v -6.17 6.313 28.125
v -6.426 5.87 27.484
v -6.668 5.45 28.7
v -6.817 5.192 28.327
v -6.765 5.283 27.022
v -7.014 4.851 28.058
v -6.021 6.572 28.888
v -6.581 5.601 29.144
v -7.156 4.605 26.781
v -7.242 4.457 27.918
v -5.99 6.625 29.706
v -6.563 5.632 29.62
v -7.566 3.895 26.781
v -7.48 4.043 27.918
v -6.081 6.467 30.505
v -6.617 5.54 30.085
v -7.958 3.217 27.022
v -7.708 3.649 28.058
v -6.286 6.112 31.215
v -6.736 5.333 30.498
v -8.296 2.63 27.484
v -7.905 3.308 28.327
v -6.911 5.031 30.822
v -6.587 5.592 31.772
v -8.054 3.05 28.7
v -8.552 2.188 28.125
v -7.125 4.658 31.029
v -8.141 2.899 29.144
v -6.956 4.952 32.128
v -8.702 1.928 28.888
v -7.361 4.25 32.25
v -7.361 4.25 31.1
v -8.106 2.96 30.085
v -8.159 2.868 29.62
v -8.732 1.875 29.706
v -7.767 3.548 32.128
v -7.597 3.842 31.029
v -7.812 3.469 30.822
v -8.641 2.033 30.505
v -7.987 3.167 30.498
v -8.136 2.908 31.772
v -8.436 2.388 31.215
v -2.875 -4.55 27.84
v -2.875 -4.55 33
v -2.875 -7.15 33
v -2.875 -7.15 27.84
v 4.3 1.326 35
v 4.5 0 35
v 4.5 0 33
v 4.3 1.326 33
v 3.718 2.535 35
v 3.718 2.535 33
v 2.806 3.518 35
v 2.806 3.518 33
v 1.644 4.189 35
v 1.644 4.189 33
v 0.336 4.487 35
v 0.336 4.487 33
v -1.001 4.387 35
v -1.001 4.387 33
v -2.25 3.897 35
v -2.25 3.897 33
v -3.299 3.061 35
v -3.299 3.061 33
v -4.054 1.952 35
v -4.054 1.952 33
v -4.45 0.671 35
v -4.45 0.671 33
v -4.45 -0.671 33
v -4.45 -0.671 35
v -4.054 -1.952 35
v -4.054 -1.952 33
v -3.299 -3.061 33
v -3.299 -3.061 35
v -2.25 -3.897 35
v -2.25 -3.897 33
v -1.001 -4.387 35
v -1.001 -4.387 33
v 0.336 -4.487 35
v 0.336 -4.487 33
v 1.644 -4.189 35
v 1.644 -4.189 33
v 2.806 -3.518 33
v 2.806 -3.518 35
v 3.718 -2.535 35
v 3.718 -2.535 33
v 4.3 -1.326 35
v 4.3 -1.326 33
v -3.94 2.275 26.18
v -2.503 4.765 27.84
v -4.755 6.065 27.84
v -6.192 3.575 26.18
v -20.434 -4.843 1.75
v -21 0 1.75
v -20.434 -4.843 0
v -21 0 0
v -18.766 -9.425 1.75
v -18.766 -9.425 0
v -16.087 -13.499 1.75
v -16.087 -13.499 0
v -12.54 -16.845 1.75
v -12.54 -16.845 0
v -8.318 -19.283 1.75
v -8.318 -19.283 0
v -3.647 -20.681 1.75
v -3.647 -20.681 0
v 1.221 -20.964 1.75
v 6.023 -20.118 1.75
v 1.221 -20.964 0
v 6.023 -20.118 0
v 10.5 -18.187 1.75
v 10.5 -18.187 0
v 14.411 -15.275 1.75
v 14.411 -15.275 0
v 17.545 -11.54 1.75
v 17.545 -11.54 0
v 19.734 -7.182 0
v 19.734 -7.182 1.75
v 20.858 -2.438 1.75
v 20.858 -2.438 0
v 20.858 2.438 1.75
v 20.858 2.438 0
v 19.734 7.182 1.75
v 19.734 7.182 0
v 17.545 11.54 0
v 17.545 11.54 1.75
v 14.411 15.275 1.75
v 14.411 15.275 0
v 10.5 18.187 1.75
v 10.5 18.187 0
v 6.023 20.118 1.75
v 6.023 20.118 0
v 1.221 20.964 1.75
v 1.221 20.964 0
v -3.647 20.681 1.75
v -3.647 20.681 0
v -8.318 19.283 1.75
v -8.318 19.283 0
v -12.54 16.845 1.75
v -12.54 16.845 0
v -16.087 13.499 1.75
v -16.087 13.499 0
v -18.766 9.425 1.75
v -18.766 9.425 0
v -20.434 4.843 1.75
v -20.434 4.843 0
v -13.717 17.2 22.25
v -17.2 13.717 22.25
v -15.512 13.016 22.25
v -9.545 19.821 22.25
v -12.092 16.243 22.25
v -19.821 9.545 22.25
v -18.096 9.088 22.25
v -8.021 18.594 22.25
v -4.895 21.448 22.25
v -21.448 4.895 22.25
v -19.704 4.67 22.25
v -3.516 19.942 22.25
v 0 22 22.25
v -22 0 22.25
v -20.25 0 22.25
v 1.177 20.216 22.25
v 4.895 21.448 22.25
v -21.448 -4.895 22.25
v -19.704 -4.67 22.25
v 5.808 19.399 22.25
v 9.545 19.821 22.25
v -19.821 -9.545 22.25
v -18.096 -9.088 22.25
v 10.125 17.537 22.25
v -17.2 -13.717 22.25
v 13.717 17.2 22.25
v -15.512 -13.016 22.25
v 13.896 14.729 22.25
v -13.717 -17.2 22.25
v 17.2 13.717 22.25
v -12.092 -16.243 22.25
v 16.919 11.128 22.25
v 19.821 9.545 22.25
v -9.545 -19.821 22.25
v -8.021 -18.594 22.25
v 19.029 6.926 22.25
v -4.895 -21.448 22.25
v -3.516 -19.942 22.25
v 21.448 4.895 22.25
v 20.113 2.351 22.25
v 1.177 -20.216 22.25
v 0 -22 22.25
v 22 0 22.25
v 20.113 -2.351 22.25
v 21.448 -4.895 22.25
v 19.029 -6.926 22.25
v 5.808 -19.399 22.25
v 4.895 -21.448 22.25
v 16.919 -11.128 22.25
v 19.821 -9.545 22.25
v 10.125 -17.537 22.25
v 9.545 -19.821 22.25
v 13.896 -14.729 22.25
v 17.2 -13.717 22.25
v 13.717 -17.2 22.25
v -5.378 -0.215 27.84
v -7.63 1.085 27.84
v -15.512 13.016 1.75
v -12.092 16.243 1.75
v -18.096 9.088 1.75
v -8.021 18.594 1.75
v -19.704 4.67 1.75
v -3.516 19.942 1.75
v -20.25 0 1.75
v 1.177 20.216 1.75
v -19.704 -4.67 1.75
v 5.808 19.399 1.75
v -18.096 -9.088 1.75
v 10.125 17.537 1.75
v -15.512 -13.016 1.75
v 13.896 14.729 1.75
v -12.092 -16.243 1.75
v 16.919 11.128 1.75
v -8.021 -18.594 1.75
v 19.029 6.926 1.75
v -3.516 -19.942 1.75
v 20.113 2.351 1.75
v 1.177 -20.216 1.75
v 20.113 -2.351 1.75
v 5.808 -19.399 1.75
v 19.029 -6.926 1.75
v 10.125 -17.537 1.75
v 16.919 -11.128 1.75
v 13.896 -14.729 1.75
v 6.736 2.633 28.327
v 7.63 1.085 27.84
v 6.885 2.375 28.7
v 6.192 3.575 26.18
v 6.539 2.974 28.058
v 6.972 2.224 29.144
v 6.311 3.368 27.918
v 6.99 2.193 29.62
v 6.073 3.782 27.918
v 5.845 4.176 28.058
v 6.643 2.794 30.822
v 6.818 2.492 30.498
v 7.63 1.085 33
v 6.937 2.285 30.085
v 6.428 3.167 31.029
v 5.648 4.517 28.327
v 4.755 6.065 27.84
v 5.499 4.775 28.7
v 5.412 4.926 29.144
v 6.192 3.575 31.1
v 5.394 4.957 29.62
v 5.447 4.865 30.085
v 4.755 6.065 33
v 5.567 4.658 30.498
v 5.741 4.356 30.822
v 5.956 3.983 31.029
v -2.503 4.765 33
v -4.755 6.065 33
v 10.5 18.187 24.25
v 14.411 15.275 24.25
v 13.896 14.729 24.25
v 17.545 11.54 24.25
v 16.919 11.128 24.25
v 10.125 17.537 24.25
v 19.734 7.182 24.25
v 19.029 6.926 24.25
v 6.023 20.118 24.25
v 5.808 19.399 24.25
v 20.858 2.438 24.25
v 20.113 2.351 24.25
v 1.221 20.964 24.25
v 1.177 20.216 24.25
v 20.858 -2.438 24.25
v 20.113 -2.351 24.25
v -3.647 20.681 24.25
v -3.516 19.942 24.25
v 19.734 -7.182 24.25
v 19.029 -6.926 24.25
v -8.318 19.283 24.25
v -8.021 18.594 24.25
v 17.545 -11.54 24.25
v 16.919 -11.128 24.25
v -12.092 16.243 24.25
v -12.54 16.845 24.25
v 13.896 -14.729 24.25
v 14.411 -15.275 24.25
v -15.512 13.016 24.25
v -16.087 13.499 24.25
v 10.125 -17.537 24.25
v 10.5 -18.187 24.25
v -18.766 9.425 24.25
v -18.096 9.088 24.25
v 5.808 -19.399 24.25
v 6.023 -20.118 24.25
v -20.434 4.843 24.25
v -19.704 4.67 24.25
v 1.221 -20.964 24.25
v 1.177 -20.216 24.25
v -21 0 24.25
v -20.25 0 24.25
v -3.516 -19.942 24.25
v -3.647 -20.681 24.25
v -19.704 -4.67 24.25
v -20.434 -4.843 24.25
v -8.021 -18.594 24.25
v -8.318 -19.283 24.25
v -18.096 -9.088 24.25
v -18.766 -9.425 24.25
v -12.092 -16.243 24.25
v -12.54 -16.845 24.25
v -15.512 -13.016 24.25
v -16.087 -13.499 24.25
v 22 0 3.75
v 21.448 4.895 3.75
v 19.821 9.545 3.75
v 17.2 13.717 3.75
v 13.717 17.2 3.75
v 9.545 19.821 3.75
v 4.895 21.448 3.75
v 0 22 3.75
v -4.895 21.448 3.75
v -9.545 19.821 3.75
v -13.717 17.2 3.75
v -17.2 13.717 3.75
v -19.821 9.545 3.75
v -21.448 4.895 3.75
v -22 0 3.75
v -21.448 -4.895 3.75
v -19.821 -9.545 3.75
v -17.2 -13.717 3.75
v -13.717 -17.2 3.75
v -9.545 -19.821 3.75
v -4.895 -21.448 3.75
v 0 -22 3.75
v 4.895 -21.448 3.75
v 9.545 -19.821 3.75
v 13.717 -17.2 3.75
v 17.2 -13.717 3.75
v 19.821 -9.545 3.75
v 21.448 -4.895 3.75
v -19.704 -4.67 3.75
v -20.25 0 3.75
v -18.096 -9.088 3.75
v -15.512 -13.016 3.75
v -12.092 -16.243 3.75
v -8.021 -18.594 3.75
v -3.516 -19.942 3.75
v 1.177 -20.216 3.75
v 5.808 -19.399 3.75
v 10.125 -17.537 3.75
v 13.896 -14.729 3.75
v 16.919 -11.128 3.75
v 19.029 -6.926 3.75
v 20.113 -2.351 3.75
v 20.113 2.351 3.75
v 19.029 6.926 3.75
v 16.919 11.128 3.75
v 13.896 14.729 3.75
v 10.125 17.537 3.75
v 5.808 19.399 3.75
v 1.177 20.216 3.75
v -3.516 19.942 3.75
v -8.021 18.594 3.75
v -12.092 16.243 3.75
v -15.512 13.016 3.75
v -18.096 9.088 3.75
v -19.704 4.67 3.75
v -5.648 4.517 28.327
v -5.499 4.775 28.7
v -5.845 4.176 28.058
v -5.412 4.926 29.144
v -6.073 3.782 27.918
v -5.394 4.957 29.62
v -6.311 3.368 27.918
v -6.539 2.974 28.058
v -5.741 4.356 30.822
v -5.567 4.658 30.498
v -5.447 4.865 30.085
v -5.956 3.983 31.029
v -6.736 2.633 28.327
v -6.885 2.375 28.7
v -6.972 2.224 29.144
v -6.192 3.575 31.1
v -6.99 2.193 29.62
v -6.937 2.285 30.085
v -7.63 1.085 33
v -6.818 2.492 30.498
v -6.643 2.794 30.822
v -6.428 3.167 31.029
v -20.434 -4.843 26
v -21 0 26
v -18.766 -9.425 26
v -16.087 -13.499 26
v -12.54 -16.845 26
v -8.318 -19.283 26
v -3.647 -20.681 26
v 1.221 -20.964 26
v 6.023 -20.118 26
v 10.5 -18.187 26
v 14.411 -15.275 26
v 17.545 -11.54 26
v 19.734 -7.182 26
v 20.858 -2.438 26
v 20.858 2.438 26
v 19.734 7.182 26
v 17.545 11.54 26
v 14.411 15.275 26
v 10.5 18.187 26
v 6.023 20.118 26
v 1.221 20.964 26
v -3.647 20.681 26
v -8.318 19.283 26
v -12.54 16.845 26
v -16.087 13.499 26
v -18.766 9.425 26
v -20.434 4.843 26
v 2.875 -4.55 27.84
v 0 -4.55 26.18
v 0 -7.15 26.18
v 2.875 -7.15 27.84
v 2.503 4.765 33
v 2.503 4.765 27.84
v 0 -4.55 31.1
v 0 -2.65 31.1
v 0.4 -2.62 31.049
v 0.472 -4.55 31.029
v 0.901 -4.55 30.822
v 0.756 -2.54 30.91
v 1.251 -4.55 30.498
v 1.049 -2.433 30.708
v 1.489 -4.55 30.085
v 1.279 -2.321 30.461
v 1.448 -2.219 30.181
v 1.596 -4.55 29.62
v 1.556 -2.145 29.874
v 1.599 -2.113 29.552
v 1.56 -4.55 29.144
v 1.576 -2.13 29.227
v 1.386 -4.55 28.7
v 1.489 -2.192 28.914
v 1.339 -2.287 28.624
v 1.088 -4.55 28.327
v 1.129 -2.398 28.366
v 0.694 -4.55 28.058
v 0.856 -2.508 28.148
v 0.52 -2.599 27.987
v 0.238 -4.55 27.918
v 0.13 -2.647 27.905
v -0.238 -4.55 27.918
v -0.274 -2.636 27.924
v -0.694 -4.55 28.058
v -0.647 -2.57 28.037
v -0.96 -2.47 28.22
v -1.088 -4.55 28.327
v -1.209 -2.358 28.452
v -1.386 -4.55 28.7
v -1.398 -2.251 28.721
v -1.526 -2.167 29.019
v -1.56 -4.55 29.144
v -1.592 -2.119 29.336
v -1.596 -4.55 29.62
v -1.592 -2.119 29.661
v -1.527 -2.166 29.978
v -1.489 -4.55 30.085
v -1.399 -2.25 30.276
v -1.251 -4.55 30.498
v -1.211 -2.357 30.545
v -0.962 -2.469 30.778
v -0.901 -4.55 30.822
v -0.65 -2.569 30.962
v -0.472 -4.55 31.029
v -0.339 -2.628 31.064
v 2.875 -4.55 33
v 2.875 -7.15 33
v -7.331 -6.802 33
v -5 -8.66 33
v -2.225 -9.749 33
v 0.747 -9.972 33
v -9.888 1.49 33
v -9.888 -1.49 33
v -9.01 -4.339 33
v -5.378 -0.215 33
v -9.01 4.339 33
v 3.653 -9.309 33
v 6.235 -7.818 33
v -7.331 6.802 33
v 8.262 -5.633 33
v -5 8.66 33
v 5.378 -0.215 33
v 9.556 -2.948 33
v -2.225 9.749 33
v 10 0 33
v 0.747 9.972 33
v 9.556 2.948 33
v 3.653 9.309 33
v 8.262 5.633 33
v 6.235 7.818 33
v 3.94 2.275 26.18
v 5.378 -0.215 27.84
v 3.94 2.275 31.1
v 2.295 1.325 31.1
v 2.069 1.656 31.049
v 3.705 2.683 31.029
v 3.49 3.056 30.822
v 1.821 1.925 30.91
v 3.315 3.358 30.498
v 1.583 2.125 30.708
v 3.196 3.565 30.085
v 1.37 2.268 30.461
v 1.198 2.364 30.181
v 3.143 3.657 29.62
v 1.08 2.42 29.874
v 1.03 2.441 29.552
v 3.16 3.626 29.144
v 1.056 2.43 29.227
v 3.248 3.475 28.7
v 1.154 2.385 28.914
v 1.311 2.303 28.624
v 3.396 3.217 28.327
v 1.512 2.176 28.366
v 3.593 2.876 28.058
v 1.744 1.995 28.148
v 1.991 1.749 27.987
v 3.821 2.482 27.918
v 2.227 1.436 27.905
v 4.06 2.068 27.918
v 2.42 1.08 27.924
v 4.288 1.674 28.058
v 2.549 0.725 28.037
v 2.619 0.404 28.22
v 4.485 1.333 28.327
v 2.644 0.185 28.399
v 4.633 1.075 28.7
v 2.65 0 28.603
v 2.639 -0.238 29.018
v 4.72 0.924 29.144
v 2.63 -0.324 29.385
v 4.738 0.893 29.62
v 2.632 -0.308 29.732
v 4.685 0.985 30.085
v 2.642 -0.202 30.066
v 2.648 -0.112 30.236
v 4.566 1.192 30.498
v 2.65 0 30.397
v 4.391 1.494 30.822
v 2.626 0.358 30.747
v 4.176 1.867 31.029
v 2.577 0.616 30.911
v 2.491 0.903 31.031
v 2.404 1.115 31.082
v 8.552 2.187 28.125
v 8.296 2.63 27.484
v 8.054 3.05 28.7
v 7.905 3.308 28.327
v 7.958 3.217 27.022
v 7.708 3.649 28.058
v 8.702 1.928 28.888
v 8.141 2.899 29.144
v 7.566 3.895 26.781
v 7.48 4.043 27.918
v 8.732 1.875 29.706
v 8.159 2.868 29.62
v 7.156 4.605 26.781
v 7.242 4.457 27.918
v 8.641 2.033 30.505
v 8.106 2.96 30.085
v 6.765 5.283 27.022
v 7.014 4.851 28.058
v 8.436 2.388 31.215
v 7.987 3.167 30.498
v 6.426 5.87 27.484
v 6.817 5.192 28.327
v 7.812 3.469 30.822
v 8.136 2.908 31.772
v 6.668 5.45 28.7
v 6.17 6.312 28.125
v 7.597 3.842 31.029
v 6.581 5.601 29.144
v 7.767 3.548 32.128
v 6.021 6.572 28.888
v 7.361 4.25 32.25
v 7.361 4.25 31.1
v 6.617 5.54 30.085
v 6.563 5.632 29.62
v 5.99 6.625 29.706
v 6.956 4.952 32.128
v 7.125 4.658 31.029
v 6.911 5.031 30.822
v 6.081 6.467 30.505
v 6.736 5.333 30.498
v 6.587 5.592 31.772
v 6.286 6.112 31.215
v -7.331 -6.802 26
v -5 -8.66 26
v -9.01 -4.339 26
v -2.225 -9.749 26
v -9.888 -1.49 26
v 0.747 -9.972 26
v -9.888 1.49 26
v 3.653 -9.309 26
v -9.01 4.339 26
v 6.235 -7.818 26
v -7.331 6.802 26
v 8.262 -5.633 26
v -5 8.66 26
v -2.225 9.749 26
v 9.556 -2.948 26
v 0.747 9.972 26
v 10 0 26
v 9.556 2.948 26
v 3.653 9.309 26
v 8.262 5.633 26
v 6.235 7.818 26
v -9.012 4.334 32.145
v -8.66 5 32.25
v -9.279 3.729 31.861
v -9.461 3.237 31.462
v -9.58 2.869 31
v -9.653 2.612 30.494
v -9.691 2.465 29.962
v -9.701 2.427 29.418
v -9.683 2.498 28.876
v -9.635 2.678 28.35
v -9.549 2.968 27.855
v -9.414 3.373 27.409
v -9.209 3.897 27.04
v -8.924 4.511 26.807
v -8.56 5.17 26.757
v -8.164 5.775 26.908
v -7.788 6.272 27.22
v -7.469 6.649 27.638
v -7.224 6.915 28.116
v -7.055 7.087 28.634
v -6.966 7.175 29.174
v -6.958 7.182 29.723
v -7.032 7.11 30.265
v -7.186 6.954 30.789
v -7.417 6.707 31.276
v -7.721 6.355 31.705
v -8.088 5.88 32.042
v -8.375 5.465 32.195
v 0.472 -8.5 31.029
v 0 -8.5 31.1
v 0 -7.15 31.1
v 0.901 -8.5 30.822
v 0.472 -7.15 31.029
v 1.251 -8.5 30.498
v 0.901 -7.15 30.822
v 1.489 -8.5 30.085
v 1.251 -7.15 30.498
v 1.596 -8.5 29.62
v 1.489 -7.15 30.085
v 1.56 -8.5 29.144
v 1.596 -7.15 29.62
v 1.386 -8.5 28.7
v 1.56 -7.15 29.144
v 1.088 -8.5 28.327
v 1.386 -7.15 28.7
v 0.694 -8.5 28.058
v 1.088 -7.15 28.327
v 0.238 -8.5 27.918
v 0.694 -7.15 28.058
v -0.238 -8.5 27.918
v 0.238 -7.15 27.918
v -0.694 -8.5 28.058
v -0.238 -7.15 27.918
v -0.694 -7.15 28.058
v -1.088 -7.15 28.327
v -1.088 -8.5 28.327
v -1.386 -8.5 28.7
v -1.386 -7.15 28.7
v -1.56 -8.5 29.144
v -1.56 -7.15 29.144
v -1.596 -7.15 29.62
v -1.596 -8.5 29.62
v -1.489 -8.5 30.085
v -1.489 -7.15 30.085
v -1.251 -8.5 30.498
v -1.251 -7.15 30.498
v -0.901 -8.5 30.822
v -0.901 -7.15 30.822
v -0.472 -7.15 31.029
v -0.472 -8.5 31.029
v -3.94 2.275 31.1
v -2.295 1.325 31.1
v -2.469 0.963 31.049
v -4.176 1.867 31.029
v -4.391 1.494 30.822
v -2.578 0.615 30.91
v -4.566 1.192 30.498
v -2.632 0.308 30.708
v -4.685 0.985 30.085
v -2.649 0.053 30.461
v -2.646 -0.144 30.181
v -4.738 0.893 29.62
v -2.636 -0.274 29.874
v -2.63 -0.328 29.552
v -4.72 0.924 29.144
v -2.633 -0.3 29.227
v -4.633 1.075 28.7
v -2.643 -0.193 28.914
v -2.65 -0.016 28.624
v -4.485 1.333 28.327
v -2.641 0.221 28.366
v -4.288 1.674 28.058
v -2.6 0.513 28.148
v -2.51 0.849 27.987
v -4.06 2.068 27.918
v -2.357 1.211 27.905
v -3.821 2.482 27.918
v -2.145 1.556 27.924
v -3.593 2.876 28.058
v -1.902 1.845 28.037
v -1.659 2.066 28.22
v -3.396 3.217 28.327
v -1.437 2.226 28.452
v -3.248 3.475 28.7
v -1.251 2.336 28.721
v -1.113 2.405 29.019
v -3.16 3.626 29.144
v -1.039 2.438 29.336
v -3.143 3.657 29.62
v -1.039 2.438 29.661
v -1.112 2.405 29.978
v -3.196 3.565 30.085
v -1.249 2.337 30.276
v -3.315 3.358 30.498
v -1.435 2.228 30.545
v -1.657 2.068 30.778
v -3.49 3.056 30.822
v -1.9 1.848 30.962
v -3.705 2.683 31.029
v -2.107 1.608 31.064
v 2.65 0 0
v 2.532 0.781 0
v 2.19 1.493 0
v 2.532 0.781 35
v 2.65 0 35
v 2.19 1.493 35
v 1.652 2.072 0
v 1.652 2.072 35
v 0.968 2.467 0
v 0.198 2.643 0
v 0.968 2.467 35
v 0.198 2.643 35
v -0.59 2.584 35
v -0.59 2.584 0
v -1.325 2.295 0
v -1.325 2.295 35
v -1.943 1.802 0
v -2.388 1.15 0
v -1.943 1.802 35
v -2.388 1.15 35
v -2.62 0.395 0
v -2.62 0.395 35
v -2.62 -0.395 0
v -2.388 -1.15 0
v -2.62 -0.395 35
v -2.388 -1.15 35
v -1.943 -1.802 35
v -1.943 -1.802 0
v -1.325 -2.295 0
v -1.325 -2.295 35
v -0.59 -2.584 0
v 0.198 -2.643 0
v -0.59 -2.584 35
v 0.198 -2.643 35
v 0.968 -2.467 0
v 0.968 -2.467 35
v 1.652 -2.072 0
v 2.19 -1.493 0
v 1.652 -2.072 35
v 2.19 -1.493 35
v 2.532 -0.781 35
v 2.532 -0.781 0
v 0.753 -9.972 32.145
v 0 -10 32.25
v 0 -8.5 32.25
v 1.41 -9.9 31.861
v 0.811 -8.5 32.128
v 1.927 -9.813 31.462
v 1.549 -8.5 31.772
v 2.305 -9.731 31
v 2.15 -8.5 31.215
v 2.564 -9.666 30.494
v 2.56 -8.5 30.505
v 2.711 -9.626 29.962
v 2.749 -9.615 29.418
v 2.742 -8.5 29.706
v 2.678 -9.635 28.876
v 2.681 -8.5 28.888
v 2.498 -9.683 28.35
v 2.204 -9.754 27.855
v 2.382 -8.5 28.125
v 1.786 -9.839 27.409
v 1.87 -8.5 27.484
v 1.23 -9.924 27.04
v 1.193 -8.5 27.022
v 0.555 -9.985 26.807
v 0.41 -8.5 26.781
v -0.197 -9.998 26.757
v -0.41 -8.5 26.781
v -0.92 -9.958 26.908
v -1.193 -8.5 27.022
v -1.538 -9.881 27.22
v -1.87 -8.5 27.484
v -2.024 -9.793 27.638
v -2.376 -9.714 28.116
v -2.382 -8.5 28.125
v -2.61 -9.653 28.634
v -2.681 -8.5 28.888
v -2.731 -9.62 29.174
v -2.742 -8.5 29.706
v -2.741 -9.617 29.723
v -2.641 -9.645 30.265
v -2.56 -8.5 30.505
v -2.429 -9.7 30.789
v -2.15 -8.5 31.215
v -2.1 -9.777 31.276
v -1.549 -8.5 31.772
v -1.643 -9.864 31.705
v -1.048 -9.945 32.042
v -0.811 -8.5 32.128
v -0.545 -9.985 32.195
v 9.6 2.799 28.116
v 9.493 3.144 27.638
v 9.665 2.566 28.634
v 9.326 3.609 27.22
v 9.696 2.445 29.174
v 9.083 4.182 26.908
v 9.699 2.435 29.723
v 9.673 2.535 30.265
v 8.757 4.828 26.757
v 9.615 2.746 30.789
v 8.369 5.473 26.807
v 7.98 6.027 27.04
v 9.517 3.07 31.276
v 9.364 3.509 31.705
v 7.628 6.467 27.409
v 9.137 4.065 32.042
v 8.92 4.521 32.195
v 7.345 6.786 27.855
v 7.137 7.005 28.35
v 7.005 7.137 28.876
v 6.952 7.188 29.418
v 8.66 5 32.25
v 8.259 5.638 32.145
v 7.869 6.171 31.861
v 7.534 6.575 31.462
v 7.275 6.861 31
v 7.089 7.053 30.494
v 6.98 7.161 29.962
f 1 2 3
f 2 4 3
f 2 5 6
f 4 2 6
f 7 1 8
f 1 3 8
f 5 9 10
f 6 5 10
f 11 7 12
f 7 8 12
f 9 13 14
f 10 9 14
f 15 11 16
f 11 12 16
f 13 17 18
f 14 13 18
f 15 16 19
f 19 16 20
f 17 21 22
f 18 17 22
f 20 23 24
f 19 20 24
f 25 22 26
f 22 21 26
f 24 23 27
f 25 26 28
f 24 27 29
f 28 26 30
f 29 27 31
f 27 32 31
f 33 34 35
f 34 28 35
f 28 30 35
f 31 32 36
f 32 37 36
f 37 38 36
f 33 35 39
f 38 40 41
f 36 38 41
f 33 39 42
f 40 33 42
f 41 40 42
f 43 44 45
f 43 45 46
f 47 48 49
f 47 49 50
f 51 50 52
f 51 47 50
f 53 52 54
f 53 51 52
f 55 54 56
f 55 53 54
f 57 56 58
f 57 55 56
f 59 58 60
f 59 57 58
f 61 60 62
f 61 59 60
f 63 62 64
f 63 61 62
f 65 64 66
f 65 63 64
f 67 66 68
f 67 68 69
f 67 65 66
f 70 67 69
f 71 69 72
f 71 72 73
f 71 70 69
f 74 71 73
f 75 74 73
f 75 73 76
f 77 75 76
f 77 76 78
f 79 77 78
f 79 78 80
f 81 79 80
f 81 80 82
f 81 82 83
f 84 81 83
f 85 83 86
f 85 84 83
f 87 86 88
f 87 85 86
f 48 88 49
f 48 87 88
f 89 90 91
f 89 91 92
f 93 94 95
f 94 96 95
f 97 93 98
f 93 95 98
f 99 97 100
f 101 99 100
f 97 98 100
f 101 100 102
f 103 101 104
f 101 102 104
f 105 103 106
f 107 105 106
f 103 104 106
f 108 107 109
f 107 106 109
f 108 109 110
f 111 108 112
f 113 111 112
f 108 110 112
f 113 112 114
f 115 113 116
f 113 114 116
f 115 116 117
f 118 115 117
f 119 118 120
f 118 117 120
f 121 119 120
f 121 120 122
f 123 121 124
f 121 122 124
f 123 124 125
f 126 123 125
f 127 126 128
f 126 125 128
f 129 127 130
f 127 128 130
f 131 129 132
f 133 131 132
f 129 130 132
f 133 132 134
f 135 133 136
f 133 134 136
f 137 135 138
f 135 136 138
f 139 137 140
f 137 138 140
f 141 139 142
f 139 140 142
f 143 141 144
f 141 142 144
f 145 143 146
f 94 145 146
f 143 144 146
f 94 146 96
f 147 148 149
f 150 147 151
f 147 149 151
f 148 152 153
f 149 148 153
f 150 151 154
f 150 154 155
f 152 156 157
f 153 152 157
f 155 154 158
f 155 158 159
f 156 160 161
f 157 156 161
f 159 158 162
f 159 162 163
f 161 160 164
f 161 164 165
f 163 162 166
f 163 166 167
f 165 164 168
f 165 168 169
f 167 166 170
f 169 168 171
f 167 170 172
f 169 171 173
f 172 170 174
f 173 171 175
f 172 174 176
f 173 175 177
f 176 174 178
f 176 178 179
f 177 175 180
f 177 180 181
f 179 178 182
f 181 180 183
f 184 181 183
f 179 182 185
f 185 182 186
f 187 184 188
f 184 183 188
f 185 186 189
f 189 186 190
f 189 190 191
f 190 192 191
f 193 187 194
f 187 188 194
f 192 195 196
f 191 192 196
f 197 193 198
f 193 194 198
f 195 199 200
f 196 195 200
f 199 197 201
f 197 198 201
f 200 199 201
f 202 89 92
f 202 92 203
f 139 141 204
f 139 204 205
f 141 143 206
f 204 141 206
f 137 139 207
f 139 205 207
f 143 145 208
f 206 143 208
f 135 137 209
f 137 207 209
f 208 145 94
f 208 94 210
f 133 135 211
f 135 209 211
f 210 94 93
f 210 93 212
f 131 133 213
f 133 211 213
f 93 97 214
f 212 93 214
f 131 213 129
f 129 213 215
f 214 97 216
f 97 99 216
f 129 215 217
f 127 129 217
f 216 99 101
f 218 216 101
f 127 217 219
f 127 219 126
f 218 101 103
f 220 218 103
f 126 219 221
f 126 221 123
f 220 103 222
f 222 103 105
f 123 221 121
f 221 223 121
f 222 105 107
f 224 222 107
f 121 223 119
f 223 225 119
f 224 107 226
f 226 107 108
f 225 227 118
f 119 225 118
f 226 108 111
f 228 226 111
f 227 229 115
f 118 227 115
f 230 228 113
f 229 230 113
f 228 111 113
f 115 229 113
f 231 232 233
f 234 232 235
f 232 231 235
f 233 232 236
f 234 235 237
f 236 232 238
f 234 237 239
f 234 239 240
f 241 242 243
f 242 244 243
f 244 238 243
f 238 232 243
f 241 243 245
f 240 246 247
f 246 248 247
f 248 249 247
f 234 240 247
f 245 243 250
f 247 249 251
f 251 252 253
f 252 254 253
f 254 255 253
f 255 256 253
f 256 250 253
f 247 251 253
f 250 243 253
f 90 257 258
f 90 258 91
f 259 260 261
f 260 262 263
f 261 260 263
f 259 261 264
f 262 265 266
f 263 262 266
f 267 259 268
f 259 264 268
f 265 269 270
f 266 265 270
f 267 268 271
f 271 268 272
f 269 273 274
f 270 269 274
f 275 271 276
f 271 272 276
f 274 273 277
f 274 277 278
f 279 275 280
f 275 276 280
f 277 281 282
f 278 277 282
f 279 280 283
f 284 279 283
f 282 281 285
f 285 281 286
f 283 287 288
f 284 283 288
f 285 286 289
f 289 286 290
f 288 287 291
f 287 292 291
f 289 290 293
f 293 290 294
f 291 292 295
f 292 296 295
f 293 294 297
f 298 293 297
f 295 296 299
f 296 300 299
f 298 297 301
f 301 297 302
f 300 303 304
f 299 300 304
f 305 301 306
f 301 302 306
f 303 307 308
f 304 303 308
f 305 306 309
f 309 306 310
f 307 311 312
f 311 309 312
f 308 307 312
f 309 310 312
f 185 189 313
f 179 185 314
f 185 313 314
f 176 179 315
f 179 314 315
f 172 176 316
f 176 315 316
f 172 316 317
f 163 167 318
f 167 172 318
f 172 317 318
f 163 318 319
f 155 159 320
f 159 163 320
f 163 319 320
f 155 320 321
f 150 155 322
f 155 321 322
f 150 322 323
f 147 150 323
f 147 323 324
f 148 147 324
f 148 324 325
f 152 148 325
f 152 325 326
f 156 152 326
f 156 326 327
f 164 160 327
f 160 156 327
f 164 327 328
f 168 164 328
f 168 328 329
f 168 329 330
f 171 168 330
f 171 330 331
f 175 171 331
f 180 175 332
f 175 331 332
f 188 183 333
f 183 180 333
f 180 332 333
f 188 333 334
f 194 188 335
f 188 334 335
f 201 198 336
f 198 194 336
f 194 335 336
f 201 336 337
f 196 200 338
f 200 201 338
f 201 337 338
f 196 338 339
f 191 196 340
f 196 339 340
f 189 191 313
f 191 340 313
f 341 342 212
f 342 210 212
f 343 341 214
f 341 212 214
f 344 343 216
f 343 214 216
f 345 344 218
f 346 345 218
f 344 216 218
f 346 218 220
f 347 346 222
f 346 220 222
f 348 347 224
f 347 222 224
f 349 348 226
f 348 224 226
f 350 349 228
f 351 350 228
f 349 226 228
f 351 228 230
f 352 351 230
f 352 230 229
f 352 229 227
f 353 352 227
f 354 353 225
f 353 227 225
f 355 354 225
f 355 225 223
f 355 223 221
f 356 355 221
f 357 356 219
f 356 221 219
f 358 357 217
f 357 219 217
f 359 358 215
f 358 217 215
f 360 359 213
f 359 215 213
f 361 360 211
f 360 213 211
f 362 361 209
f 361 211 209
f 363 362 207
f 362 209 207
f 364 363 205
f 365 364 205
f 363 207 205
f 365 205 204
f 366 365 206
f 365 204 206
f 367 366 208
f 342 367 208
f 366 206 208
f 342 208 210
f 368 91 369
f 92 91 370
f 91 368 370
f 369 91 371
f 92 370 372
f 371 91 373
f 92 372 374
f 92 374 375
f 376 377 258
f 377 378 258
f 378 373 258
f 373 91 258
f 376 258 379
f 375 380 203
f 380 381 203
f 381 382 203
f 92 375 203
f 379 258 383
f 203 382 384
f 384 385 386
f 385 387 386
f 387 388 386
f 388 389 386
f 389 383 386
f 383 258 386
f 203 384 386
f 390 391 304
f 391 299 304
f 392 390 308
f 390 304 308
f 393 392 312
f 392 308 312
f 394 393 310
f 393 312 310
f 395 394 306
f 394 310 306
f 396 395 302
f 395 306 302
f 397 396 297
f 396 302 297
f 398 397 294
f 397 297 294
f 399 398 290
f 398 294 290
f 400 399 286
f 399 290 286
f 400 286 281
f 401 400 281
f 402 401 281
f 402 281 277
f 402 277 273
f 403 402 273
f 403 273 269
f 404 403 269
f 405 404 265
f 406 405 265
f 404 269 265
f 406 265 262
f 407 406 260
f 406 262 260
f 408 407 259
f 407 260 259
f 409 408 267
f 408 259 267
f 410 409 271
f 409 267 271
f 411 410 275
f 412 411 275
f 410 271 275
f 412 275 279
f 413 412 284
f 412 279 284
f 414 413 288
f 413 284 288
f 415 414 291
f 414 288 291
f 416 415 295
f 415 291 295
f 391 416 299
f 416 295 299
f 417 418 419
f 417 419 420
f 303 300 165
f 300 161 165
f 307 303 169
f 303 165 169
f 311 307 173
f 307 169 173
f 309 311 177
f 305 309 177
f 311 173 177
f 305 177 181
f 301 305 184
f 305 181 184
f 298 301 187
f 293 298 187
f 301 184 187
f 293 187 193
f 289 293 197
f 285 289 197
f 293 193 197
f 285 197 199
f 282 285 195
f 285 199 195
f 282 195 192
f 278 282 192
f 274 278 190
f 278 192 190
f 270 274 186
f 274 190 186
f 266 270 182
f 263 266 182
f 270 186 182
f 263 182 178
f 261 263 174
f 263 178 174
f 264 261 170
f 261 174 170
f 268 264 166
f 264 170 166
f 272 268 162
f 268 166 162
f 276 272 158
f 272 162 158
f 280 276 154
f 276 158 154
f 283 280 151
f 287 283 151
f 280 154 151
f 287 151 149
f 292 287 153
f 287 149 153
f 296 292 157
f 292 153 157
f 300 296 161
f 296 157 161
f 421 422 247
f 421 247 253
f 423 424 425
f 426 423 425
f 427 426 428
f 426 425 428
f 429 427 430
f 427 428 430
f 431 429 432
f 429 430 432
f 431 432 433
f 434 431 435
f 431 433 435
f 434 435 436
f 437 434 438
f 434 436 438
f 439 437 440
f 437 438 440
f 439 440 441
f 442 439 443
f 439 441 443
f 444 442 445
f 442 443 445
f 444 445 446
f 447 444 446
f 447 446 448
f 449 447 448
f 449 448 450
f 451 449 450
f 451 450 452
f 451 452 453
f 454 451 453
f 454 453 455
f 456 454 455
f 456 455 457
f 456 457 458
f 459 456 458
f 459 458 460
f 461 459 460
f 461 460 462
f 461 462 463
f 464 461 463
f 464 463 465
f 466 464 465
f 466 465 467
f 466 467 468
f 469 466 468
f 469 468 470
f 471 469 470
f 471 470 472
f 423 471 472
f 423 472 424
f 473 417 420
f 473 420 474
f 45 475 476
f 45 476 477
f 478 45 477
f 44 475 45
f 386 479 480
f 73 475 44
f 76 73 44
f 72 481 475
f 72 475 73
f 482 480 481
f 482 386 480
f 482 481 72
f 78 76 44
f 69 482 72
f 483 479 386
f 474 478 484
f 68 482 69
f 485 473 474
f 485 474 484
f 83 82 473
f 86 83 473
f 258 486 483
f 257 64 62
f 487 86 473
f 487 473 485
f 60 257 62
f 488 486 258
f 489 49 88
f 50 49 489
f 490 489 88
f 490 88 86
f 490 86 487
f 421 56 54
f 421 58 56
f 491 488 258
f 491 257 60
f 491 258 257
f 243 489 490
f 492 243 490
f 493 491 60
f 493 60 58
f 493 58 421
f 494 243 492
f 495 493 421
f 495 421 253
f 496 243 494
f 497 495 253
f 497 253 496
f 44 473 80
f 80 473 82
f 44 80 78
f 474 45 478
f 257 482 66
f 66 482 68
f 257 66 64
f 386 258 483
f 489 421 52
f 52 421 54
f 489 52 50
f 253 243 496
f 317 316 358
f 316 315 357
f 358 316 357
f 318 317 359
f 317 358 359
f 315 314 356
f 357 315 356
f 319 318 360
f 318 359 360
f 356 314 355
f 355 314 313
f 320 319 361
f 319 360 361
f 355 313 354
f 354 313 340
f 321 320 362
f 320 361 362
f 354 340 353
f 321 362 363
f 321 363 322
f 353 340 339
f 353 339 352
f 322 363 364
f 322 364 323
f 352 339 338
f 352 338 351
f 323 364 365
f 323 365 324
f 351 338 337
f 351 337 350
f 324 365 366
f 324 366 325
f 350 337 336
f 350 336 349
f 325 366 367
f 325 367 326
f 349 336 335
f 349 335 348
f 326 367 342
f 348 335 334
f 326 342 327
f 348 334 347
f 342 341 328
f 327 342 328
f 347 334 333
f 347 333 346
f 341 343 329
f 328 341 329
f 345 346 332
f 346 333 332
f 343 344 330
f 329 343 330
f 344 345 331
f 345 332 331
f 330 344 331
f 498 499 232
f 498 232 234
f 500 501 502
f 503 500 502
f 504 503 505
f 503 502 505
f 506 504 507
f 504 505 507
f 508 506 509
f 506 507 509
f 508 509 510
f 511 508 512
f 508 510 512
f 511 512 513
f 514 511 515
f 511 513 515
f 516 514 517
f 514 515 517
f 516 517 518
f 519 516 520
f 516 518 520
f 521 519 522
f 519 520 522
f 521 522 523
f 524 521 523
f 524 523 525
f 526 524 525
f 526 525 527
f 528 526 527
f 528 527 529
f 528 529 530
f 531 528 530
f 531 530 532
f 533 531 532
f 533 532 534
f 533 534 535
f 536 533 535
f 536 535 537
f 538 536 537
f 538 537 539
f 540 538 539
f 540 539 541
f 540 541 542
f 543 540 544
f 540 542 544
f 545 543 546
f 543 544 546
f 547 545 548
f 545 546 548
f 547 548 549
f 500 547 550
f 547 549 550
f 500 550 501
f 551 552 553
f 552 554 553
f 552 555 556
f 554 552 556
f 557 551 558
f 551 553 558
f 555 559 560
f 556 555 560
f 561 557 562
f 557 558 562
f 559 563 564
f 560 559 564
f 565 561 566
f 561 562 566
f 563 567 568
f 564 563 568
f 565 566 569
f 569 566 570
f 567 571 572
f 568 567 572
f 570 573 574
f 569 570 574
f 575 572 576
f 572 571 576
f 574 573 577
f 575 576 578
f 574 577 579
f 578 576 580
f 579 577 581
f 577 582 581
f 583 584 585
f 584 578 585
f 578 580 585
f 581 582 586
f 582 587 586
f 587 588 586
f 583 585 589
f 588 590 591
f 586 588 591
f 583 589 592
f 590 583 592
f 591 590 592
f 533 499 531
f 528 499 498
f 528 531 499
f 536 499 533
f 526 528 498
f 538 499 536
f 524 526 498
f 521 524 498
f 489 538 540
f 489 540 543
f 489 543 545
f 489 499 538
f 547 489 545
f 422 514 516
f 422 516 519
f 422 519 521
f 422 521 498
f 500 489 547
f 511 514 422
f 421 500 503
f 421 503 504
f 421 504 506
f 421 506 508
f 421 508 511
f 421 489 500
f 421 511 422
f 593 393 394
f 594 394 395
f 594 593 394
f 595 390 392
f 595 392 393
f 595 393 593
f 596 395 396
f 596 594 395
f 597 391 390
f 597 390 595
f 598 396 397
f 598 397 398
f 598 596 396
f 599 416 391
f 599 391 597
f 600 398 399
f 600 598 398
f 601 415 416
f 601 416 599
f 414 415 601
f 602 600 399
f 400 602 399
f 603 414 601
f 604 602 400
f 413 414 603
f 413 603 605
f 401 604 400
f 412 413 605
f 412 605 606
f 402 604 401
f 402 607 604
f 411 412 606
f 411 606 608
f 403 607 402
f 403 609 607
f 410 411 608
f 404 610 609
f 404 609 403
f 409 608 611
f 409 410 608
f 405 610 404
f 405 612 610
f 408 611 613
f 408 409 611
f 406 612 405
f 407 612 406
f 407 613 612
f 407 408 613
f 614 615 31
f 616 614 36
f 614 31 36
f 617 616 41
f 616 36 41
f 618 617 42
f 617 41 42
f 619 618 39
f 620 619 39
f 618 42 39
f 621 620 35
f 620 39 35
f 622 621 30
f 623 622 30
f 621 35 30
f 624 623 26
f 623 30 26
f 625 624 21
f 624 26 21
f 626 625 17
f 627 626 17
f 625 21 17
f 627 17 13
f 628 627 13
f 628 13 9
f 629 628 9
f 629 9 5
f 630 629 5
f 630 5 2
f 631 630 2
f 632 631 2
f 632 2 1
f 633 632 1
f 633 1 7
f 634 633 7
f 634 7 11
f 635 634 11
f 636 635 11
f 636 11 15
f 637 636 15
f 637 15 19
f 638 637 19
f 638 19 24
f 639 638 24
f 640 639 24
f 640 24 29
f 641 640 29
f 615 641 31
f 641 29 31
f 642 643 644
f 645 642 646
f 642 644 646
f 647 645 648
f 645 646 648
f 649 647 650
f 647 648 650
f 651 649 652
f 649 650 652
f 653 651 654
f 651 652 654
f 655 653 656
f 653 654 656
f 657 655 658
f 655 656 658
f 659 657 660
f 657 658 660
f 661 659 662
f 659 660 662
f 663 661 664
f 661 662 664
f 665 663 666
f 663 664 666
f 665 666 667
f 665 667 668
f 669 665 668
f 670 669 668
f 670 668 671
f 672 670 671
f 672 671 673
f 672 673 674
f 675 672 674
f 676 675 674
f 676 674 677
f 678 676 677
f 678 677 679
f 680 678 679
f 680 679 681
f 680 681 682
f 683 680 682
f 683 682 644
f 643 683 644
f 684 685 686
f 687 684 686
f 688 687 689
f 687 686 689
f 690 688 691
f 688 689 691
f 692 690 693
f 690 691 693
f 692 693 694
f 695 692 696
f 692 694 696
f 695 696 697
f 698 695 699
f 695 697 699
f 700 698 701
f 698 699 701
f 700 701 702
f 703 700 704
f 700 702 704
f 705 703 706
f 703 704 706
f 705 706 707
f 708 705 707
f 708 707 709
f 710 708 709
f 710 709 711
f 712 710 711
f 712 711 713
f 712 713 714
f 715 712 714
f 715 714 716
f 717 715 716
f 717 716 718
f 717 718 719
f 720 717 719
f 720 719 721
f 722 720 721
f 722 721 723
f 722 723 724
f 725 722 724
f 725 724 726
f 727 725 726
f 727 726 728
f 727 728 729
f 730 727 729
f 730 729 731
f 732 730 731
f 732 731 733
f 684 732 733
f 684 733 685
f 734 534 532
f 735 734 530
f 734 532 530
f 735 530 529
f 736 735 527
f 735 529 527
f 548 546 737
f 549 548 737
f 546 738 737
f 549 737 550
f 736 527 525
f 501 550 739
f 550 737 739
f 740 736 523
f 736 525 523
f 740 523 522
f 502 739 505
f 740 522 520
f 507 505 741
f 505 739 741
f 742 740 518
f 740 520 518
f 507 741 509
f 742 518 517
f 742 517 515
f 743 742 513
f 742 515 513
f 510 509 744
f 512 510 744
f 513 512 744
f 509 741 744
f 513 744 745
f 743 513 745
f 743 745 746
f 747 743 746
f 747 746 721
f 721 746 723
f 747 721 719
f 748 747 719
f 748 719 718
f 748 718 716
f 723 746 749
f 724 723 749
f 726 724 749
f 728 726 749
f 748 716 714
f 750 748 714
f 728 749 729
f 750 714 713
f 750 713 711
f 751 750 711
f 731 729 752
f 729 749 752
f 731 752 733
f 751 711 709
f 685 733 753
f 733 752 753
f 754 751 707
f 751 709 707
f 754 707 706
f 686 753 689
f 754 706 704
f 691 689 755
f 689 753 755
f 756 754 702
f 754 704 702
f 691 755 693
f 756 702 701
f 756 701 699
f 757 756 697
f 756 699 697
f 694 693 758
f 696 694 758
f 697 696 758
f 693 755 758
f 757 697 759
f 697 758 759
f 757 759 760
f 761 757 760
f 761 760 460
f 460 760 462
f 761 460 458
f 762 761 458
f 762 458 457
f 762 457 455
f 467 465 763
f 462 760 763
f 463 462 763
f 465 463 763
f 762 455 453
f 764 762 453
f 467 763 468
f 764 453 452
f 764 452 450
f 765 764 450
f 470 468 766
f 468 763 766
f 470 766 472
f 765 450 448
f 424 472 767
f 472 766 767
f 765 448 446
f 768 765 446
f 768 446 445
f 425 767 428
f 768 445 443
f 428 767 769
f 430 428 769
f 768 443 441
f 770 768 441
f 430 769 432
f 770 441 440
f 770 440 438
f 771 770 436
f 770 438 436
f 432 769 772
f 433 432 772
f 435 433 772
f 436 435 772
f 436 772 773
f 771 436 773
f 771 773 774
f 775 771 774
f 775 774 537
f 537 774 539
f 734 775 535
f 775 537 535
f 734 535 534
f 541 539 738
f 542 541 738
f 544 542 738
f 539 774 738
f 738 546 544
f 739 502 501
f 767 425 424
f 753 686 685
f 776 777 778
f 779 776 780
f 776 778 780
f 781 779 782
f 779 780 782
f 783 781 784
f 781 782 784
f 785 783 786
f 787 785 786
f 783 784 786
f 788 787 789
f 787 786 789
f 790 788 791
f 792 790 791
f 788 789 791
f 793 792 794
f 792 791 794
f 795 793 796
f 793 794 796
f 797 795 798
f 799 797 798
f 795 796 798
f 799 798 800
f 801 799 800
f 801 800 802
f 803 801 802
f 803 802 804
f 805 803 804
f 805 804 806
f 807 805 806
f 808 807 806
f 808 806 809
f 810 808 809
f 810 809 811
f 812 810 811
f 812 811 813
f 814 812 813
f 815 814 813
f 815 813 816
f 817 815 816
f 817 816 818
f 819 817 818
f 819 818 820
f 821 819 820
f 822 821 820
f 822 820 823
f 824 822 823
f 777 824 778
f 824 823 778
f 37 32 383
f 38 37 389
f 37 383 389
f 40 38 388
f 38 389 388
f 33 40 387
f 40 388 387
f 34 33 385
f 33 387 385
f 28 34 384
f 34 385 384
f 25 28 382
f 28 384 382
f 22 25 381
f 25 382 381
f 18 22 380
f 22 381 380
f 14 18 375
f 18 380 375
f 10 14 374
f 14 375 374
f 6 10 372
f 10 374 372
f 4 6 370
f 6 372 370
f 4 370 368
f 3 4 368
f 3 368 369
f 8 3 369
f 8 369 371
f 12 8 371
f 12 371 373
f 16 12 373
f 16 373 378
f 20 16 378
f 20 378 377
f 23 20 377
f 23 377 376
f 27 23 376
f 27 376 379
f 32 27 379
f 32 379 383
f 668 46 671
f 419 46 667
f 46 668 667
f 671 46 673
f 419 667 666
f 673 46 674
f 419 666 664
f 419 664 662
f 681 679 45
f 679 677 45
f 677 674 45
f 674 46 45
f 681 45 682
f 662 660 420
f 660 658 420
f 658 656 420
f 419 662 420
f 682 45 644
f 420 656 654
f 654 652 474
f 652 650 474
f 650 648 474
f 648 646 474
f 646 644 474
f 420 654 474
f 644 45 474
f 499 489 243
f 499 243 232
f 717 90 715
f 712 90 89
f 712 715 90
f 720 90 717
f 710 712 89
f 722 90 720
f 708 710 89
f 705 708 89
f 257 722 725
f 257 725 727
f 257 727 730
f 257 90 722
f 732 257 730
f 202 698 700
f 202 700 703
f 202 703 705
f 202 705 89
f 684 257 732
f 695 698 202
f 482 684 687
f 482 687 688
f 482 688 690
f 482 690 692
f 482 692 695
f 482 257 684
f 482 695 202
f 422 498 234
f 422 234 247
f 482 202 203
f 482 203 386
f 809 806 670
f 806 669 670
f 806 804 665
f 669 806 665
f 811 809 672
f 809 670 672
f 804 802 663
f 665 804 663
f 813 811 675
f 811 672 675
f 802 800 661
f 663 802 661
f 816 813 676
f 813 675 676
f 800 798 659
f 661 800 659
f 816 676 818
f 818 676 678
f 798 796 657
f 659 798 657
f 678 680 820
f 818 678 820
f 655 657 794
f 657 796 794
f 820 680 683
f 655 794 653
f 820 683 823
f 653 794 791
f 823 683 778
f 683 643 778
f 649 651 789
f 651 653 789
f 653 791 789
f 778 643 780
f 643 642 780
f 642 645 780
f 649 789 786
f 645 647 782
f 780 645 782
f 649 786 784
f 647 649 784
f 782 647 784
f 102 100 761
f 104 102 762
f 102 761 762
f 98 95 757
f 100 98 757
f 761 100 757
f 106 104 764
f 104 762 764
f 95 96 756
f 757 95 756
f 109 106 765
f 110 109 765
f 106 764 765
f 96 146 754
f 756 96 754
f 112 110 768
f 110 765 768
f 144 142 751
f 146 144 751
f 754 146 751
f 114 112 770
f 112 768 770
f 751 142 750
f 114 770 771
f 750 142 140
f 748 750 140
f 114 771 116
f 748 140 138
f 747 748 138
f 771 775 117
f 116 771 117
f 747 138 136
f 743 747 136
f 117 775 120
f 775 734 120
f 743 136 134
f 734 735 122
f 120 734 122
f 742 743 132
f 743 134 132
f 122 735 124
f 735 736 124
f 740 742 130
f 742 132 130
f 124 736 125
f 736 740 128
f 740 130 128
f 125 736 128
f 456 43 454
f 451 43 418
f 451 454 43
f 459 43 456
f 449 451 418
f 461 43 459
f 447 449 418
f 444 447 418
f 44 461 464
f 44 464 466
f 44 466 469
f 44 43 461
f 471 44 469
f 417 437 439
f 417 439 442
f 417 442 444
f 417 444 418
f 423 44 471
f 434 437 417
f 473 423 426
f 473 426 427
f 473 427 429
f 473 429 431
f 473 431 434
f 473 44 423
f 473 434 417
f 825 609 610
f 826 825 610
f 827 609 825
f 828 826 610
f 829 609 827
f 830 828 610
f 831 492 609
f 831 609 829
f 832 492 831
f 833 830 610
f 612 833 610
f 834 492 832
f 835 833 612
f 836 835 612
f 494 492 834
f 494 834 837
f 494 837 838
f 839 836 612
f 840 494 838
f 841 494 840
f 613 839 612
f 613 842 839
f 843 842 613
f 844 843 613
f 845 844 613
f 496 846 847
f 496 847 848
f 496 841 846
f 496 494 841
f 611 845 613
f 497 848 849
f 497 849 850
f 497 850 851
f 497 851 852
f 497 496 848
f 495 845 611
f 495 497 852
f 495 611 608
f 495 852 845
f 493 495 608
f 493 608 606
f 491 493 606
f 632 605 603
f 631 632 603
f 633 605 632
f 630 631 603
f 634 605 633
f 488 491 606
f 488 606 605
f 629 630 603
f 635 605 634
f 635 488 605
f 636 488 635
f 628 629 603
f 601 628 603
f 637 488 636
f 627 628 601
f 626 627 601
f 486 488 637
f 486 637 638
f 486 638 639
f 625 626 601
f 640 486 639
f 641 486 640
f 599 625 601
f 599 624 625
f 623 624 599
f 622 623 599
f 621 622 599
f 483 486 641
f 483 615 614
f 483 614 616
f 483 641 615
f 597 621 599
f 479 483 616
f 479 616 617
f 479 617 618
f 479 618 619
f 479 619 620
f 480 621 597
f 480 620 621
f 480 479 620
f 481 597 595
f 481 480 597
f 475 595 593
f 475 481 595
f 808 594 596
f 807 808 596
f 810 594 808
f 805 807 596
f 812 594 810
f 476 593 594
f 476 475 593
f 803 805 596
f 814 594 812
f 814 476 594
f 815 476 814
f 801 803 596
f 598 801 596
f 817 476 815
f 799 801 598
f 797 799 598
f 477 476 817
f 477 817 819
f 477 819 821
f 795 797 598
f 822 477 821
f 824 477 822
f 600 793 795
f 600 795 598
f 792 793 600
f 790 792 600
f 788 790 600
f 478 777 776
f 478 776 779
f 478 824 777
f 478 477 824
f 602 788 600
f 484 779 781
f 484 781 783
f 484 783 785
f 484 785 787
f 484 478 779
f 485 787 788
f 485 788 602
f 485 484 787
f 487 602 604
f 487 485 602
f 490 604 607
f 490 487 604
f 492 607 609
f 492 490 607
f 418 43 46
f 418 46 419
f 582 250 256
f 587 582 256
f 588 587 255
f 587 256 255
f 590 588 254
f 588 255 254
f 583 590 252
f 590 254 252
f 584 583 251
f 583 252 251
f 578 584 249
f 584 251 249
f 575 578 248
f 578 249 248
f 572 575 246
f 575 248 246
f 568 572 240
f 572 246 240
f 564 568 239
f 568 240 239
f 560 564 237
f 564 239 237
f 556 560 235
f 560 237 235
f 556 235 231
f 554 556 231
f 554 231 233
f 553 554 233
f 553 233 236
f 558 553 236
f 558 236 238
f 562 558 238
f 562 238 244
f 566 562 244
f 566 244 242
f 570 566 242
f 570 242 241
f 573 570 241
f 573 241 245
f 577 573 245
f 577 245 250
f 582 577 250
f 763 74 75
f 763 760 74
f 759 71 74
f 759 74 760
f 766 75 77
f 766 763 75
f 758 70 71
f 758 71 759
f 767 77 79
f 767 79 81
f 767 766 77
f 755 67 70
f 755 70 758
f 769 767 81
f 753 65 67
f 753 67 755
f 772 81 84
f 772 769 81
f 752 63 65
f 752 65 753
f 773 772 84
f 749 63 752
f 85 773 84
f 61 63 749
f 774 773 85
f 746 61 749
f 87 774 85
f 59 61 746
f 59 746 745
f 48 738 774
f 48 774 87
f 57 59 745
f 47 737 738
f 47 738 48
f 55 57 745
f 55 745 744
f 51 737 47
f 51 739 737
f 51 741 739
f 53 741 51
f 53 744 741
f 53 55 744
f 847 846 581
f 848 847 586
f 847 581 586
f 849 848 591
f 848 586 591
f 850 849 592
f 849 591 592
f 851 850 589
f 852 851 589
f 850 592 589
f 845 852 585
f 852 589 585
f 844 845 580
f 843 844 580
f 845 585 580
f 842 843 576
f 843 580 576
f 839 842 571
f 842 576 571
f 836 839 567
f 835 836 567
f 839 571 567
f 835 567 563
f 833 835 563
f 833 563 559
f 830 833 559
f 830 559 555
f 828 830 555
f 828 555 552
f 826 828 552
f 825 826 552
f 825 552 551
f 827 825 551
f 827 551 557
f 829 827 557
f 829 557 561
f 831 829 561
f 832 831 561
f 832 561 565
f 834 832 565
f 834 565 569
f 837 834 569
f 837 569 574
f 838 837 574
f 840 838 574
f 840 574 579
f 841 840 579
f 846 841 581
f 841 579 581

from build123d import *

# Parameters (mm, degrees)
EXTRUDE_1_OUTLINE_R      = 22
EXTRUDE_1_DEPTH          = 26
SKETCH_2_W               = 1.75
SKETCH_2_H               = 1
SKETCH_2_W_2             = 2
SKETCH_2_H_2             = 1.75
SKETCH_3_R               = 2.65
CUT_EXTRUDE_1_DEPTH      = 41.546269865
EXTRUDE_START            = 7
SKETCH_4_R               = 10
SKETCH_4_R_2             = 2.65
EXTRUDE_2_DEPTH          = 7
SKETCH_5_R               = 1.6
CUT_EXTRUDE_2_DEPTH      = 46.354161882
CUT_EXTRUDE_START        = -8.5
SKETCH_6_R               = 2.75
SKETCH_6_R_2             = 1.6
CUT_EXTRUDE_3_DEPTH      = 9
CUT_EXTRUDE_START_2      = -9.45
CUT_EXTRUDE_4_OUTLINE_R  = 1.6
CUT_EXTRUDE_4_DEPTH      = 2.6
PATTERN_CIRCULAR_1_COUNT = 3
EXTRUDE_START_2          = 2
SKETCH_8_R               = 4.5
SKETCH_8_R_2             = 2.65
EXTRUDE_3_DEPTH          = 2


# Read off the part's stored shape, not the designer's step: Бобышка-Вытянуть1, Вырез-Вытянуть4
with BuildPart() as part:
    # Бобышка-Вытянуть1 outline → Бобышка-Вытянуть1 (new body)
    with BuildSketch(Plane.XY):
        Circle(EXTRUDE_1_OUTLINE_R)
    extrude(amount=EXTRUDE_1_DEPTH)

    # Эскиз2 → Вырез-Повернуть1 (revolve, cut)
    with BuildSketch(Plane(origin=(0, 0, 0), x_dir=(0, 0, -1), z_dir=(1, 0, 0)), mode=Mode.PRIVATE) as cut_revolve_1_sk:
        Polygon((-3.75, 22), (-3.75, 20.25), (-1.75, 20.25), (-1.75, 21), (-1.75, 22), align=None)
        Polygon((-24.25, 21), (-24.25, 20.25), (-22.25, 20.25), (-22.25, 22), (-24.25, 22), align=None)
        with Locations((-25.125, 21.5)):
            Rectangle(SKETCH_2_W, SKETCH_2_H)
        with Locations((-23.25, 21.125)):
            Rectangle(SKETCH_2_W_2, SKETCH_2_H_2)
        with Locations((-2.75, 21.125)):
            Rectangle(SKETCH_2_W_2, SKETCH_2_H_2)
        with Locations((-0.875, 21.5)):
            Rectangle(SKETCH_2_W, SKETCH_2_H)
    revolve(cut_revolve_1_sk.sketch.rotate(Axis((0, 0, 0), (0, 0, 1)), 90), axis=Axis((0, 0, 0), (0, 0, 1)), mode=Mode.SUBTRACT)

    # Эскиз3 → Вырез-Вытянуть1 (cut, through all)
    with BuildSketch(Plane.XY.offset(26)):
        Circle(SKETCH_3_R)
    extrude(amount=-CUT_EXTRUDE_1_DEPTH, mode=Mode.SUBTRACT)

    # Эскиз4 → Бобышка-Вытянуть2 (add)
    with BuildSketch(Plane.XY.offset(26).offset(EXTRUDE_START)):
        Circle(SKETCH_4_R)
        Circle(SKETCH_4_R_2, mode=Mode.SUBTRACT)
    extrude(amount=-EXTRUDE_2_DEPTH)

    # Эскиз5 → Вырез-Вытянуть2 (cut, through all)
    with BuildSketch(Plane(origin=(0, 0, 0), x_dir=(1, 0, 0), z_dir=(0, 1, 0))):
        with Locations(Location((0, -29.5, 0), (0, 0, 270))):
            Circle(SKETCH_5_R)
    cut_extrude_2 = extrude(amount=-CUT_EXTRUDE_2_DEPTH, mode=Mode.SUBTRACT)

    # Эскиз6 → Вырез-Вытянуть3 (cut)
    with BuildSketch(Plane(origin=(0, 0, 0), x_dir=(1, 0, 0), z_dir=(0, 1, 0)).offset(CUT_EXTRUDE_START)):
        with Locations(Location((0, -29.5, 0), (0, 0, 270))):
            Circle(SKETCH_6_R)
        with Locations(Location((0, -29.5, 0), (0, 0, 270))):
            Circle(SKETCH_6_R_2, mode=Mode.SUBTRACT)
    cut_extrude_3 = extrude(amount=-CUT_EXTRUDE_3_DEPTH, mode=Mode.SUBTRACT)

    # Вырез-Вытянуть4 outline → Вырез-Вытянуть4 (cut)
    with BuildSketch(Plane.XZ.offset(14).offset(CUT_EXTRUDE_START_2)):
        Polygon((-2.875, 27.840117976), (0, 26.180235952), (2.875, 27.840117976), (2.875, 33), (-2.875, 33), align=None)
        with Locations((0, 29.5)):
            Circle(CUT_EXTRUDE_4_OUTLINE_R, mode=Mode.SUBTRACT)
    cut_extrude_4 = extrude(amount=CUT_EXTRUDE_4_DEPTH, mode=Mode.SUBTRACT)

    # Круговой массив1: Вырез-Вытянуть2, Вырез-Вытянуть3, Вырез-Вытянуть4 ×3 about axis
    pattern_circular_1_axis = Axis((0, 0, 0), (0, 0, 1))
    add([cut_extrude_2.rotate(pattern_circular_1_axis, i * 360 / PATTERN_CIRCULAR_1_COUNT) for i in range(1, PATTERN_CIRCULAR_1_COUNT)], mode=Mode.SUBTRACT)
    add([cut_extrude_3.rotate(pattern_circular_1_axis, i * 360 / PATTERN_CIRCULAR_1_COUNT) for i in range(1, PATTERN_CIRCULAR_1_COUNT)], mode=Mode.SUBTRACT)
    add([cut_extrude_4.rotate(pattern_circular_1_axis, i * 360 / PATTERN_CIRCULAR_1_COUNT) for i in range(1, PATTERN_CIRCULAR_1_COUNT)], mode=Mode.SUBTRACT)

    # Эскиз8 → Бобышка-Вытянуть3 (add)
    with BuildSketch(Plane.XY.offset(33).offset(EXTRUDE_START_2)):
        Circle(SKETCH_8_R)
        Circle(SKETCH_8_R_2, mode=Mode.SUBTRACT)
    extrude(amount=-EXTRUDE_3_DEPTH)


solid = part.part
